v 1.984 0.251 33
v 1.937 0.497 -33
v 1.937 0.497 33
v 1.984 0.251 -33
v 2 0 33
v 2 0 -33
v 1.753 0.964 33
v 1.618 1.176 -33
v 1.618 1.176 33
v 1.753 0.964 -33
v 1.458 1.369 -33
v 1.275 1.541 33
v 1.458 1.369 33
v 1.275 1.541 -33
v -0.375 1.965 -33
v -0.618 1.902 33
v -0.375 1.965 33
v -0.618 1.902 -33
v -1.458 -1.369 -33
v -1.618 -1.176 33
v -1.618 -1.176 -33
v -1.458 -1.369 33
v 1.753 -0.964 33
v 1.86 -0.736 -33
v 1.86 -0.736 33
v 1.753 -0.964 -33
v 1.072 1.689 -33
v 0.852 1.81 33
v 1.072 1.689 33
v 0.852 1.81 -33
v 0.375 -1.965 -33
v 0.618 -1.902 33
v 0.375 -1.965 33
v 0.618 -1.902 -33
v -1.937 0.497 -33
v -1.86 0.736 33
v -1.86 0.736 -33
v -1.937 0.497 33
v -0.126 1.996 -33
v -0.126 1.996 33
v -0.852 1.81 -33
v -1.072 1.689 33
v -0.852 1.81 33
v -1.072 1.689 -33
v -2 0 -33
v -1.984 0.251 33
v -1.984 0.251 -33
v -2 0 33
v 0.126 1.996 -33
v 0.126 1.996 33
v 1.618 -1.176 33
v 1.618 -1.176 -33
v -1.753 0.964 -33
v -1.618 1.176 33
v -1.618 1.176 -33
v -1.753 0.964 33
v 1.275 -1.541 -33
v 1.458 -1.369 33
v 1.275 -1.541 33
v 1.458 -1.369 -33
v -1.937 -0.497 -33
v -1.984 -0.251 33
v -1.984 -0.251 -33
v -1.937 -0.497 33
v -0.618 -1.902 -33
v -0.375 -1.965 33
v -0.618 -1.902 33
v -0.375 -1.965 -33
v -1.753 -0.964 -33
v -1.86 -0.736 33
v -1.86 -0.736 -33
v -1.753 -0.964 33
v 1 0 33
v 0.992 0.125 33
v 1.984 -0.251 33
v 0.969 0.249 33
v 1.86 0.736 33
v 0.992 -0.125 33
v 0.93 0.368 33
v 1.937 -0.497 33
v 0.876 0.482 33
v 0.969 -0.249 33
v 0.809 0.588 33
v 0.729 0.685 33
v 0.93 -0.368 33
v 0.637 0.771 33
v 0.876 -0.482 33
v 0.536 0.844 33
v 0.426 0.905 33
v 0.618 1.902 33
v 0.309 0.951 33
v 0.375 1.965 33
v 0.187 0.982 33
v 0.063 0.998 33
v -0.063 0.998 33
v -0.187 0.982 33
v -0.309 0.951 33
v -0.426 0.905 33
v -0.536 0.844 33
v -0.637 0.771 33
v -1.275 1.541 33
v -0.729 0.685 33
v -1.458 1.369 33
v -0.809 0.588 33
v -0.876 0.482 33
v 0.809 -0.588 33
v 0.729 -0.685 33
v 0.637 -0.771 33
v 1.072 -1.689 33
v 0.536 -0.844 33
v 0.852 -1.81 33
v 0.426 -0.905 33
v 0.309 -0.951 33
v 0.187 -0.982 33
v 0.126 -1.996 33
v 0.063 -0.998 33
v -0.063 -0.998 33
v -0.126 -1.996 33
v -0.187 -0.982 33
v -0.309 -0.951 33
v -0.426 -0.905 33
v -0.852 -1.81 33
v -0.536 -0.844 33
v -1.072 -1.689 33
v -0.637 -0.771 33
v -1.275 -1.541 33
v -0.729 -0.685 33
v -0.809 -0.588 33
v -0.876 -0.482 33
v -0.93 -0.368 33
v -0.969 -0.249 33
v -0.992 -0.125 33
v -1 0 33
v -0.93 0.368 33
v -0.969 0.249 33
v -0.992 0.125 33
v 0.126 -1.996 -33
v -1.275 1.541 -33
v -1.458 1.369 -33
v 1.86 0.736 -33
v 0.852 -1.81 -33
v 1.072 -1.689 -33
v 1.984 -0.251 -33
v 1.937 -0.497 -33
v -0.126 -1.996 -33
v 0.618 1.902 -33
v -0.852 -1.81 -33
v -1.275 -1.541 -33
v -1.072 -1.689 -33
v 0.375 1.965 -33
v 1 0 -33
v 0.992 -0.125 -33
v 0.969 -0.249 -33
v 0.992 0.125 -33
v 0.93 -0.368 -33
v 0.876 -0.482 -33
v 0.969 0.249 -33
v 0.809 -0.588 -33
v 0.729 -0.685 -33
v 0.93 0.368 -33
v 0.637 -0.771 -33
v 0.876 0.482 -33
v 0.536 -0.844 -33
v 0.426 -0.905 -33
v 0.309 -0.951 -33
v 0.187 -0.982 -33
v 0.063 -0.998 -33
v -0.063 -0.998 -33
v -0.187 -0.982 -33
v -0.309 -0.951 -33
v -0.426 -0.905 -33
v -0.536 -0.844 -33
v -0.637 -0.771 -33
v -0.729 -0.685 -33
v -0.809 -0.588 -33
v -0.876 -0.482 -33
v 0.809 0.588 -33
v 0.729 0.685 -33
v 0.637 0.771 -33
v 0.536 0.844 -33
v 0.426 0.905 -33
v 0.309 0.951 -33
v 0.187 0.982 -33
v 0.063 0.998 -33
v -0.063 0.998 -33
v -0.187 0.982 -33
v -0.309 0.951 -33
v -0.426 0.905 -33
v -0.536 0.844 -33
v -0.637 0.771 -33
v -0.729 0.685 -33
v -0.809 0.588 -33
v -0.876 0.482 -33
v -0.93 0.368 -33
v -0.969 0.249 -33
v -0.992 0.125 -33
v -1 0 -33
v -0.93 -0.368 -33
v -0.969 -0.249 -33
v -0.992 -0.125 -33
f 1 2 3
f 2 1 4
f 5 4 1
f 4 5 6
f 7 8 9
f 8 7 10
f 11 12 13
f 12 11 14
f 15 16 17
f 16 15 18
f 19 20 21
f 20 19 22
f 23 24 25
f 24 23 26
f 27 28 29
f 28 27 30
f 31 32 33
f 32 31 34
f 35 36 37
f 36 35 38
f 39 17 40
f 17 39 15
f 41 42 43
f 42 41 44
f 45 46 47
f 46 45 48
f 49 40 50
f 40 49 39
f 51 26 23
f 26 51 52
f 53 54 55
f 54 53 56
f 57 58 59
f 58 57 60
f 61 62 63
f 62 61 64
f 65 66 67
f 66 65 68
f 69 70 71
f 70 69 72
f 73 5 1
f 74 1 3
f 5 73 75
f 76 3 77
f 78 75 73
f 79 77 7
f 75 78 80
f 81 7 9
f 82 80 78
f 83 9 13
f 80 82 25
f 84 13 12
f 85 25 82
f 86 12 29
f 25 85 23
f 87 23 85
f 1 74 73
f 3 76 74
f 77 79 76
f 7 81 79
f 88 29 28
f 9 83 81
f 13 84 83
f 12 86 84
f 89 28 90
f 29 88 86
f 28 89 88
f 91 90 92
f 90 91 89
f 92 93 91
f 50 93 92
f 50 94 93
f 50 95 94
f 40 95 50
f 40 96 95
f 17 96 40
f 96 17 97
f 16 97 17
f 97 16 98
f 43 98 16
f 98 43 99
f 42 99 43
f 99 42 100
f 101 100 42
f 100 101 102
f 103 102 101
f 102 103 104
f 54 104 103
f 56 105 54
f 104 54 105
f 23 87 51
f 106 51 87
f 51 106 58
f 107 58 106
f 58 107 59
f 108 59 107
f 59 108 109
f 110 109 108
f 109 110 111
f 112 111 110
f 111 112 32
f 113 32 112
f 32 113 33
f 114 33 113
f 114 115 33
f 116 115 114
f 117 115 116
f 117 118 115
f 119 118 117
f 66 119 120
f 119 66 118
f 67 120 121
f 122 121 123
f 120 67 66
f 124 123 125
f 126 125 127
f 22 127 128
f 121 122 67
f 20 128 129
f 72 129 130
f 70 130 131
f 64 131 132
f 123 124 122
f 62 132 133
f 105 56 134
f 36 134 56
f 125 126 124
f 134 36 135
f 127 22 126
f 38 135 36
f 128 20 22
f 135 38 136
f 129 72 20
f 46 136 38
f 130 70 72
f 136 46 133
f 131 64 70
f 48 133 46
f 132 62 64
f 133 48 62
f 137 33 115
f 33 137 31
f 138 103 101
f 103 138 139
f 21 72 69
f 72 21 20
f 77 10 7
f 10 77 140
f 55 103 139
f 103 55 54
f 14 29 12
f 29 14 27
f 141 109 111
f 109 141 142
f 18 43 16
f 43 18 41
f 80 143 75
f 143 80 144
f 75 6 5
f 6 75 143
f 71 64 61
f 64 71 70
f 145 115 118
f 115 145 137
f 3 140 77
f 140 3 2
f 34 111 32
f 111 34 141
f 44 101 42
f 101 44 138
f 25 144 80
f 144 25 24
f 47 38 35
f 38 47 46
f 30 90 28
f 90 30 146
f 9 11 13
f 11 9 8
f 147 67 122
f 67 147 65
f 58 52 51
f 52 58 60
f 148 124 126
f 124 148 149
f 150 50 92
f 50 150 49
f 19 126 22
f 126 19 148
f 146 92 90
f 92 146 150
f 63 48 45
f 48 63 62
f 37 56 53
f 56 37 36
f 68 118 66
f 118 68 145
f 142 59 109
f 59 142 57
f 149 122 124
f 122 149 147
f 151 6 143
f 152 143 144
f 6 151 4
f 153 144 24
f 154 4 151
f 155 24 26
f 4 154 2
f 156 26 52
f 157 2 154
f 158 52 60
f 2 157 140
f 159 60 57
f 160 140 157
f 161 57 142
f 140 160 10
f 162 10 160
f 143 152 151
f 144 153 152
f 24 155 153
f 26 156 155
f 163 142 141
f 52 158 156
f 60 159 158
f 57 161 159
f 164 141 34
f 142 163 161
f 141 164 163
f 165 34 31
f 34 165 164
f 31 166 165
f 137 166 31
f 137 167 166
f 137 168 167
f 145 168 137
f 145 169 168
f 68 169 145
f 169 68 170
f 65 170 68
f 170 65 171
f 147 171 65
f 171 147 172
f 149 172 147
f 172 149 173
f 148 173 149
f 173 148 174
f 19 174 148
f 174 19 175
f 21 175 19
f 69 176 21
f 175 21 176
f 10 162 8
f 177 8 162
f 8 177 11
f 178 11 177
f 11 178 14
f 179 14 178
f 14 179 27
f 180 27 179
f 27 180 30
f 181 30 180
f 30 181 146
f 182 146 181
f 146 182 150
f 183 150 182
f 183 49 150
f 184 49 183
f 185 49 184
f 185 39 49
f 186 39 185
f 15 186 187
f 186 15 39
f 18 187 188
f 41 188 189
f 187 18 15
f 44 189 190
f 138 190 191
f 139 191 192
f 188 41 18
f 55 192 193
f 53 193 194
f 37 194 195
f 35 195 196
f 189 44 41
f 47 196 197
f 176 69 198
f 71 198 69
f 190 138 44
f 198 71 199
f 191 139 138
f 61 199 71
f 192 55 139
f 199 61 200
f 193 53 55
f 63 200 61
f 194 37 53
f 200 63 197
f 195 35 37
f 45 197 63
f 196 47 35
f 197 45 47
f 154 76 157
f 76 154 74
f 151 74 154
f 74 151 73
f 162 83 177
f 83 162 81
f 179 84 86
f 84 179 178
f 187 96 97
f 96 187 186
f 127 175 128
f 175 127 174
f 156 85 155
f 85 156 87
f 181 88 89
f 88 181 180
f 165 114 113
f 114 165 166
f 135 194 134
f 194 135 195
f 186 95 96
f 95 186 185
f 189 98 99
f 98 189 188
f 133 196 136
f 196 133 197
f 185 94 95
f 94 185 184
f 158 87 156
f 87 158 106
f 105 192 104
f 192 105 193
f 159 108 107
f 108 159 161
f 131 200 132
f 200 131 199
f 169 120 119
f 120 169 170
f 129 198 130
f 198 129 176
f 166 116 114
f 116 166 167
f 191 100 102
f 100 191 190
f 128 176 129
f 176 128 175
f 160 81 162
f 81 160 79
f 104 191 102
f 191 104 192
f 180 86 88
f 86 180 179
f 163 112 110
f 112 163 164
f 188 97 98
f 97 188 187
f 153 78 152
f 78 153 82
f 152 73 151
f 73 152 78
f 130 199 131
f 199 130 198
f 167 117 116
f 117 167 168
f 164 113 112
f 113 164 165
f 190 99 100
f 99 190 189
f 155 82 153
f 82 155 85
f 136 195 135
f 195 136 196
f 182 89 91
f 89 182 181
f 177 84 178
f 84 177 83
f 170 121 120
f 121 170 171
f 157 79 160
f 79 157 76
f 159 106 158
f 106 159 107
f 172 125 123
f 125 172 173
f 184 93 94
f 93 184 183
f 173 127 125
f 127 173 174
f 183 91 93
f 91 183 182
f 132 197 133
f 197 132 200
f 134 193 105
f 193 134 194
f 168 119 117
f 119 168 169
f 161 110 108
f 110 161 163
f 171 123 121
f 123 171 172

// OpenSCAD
$fn = 50;


difference() {
	union() {
		translate(v = [0, 0, -33.0000000000]) {
			cylinder(h = 66, r = 2.0000000000);
		}
	}
	union() {
		translate(v = [0, 0, -100.0000000000]) {
			cylinder(h = 200, r = 1.0000000000);
		}
	}
}
